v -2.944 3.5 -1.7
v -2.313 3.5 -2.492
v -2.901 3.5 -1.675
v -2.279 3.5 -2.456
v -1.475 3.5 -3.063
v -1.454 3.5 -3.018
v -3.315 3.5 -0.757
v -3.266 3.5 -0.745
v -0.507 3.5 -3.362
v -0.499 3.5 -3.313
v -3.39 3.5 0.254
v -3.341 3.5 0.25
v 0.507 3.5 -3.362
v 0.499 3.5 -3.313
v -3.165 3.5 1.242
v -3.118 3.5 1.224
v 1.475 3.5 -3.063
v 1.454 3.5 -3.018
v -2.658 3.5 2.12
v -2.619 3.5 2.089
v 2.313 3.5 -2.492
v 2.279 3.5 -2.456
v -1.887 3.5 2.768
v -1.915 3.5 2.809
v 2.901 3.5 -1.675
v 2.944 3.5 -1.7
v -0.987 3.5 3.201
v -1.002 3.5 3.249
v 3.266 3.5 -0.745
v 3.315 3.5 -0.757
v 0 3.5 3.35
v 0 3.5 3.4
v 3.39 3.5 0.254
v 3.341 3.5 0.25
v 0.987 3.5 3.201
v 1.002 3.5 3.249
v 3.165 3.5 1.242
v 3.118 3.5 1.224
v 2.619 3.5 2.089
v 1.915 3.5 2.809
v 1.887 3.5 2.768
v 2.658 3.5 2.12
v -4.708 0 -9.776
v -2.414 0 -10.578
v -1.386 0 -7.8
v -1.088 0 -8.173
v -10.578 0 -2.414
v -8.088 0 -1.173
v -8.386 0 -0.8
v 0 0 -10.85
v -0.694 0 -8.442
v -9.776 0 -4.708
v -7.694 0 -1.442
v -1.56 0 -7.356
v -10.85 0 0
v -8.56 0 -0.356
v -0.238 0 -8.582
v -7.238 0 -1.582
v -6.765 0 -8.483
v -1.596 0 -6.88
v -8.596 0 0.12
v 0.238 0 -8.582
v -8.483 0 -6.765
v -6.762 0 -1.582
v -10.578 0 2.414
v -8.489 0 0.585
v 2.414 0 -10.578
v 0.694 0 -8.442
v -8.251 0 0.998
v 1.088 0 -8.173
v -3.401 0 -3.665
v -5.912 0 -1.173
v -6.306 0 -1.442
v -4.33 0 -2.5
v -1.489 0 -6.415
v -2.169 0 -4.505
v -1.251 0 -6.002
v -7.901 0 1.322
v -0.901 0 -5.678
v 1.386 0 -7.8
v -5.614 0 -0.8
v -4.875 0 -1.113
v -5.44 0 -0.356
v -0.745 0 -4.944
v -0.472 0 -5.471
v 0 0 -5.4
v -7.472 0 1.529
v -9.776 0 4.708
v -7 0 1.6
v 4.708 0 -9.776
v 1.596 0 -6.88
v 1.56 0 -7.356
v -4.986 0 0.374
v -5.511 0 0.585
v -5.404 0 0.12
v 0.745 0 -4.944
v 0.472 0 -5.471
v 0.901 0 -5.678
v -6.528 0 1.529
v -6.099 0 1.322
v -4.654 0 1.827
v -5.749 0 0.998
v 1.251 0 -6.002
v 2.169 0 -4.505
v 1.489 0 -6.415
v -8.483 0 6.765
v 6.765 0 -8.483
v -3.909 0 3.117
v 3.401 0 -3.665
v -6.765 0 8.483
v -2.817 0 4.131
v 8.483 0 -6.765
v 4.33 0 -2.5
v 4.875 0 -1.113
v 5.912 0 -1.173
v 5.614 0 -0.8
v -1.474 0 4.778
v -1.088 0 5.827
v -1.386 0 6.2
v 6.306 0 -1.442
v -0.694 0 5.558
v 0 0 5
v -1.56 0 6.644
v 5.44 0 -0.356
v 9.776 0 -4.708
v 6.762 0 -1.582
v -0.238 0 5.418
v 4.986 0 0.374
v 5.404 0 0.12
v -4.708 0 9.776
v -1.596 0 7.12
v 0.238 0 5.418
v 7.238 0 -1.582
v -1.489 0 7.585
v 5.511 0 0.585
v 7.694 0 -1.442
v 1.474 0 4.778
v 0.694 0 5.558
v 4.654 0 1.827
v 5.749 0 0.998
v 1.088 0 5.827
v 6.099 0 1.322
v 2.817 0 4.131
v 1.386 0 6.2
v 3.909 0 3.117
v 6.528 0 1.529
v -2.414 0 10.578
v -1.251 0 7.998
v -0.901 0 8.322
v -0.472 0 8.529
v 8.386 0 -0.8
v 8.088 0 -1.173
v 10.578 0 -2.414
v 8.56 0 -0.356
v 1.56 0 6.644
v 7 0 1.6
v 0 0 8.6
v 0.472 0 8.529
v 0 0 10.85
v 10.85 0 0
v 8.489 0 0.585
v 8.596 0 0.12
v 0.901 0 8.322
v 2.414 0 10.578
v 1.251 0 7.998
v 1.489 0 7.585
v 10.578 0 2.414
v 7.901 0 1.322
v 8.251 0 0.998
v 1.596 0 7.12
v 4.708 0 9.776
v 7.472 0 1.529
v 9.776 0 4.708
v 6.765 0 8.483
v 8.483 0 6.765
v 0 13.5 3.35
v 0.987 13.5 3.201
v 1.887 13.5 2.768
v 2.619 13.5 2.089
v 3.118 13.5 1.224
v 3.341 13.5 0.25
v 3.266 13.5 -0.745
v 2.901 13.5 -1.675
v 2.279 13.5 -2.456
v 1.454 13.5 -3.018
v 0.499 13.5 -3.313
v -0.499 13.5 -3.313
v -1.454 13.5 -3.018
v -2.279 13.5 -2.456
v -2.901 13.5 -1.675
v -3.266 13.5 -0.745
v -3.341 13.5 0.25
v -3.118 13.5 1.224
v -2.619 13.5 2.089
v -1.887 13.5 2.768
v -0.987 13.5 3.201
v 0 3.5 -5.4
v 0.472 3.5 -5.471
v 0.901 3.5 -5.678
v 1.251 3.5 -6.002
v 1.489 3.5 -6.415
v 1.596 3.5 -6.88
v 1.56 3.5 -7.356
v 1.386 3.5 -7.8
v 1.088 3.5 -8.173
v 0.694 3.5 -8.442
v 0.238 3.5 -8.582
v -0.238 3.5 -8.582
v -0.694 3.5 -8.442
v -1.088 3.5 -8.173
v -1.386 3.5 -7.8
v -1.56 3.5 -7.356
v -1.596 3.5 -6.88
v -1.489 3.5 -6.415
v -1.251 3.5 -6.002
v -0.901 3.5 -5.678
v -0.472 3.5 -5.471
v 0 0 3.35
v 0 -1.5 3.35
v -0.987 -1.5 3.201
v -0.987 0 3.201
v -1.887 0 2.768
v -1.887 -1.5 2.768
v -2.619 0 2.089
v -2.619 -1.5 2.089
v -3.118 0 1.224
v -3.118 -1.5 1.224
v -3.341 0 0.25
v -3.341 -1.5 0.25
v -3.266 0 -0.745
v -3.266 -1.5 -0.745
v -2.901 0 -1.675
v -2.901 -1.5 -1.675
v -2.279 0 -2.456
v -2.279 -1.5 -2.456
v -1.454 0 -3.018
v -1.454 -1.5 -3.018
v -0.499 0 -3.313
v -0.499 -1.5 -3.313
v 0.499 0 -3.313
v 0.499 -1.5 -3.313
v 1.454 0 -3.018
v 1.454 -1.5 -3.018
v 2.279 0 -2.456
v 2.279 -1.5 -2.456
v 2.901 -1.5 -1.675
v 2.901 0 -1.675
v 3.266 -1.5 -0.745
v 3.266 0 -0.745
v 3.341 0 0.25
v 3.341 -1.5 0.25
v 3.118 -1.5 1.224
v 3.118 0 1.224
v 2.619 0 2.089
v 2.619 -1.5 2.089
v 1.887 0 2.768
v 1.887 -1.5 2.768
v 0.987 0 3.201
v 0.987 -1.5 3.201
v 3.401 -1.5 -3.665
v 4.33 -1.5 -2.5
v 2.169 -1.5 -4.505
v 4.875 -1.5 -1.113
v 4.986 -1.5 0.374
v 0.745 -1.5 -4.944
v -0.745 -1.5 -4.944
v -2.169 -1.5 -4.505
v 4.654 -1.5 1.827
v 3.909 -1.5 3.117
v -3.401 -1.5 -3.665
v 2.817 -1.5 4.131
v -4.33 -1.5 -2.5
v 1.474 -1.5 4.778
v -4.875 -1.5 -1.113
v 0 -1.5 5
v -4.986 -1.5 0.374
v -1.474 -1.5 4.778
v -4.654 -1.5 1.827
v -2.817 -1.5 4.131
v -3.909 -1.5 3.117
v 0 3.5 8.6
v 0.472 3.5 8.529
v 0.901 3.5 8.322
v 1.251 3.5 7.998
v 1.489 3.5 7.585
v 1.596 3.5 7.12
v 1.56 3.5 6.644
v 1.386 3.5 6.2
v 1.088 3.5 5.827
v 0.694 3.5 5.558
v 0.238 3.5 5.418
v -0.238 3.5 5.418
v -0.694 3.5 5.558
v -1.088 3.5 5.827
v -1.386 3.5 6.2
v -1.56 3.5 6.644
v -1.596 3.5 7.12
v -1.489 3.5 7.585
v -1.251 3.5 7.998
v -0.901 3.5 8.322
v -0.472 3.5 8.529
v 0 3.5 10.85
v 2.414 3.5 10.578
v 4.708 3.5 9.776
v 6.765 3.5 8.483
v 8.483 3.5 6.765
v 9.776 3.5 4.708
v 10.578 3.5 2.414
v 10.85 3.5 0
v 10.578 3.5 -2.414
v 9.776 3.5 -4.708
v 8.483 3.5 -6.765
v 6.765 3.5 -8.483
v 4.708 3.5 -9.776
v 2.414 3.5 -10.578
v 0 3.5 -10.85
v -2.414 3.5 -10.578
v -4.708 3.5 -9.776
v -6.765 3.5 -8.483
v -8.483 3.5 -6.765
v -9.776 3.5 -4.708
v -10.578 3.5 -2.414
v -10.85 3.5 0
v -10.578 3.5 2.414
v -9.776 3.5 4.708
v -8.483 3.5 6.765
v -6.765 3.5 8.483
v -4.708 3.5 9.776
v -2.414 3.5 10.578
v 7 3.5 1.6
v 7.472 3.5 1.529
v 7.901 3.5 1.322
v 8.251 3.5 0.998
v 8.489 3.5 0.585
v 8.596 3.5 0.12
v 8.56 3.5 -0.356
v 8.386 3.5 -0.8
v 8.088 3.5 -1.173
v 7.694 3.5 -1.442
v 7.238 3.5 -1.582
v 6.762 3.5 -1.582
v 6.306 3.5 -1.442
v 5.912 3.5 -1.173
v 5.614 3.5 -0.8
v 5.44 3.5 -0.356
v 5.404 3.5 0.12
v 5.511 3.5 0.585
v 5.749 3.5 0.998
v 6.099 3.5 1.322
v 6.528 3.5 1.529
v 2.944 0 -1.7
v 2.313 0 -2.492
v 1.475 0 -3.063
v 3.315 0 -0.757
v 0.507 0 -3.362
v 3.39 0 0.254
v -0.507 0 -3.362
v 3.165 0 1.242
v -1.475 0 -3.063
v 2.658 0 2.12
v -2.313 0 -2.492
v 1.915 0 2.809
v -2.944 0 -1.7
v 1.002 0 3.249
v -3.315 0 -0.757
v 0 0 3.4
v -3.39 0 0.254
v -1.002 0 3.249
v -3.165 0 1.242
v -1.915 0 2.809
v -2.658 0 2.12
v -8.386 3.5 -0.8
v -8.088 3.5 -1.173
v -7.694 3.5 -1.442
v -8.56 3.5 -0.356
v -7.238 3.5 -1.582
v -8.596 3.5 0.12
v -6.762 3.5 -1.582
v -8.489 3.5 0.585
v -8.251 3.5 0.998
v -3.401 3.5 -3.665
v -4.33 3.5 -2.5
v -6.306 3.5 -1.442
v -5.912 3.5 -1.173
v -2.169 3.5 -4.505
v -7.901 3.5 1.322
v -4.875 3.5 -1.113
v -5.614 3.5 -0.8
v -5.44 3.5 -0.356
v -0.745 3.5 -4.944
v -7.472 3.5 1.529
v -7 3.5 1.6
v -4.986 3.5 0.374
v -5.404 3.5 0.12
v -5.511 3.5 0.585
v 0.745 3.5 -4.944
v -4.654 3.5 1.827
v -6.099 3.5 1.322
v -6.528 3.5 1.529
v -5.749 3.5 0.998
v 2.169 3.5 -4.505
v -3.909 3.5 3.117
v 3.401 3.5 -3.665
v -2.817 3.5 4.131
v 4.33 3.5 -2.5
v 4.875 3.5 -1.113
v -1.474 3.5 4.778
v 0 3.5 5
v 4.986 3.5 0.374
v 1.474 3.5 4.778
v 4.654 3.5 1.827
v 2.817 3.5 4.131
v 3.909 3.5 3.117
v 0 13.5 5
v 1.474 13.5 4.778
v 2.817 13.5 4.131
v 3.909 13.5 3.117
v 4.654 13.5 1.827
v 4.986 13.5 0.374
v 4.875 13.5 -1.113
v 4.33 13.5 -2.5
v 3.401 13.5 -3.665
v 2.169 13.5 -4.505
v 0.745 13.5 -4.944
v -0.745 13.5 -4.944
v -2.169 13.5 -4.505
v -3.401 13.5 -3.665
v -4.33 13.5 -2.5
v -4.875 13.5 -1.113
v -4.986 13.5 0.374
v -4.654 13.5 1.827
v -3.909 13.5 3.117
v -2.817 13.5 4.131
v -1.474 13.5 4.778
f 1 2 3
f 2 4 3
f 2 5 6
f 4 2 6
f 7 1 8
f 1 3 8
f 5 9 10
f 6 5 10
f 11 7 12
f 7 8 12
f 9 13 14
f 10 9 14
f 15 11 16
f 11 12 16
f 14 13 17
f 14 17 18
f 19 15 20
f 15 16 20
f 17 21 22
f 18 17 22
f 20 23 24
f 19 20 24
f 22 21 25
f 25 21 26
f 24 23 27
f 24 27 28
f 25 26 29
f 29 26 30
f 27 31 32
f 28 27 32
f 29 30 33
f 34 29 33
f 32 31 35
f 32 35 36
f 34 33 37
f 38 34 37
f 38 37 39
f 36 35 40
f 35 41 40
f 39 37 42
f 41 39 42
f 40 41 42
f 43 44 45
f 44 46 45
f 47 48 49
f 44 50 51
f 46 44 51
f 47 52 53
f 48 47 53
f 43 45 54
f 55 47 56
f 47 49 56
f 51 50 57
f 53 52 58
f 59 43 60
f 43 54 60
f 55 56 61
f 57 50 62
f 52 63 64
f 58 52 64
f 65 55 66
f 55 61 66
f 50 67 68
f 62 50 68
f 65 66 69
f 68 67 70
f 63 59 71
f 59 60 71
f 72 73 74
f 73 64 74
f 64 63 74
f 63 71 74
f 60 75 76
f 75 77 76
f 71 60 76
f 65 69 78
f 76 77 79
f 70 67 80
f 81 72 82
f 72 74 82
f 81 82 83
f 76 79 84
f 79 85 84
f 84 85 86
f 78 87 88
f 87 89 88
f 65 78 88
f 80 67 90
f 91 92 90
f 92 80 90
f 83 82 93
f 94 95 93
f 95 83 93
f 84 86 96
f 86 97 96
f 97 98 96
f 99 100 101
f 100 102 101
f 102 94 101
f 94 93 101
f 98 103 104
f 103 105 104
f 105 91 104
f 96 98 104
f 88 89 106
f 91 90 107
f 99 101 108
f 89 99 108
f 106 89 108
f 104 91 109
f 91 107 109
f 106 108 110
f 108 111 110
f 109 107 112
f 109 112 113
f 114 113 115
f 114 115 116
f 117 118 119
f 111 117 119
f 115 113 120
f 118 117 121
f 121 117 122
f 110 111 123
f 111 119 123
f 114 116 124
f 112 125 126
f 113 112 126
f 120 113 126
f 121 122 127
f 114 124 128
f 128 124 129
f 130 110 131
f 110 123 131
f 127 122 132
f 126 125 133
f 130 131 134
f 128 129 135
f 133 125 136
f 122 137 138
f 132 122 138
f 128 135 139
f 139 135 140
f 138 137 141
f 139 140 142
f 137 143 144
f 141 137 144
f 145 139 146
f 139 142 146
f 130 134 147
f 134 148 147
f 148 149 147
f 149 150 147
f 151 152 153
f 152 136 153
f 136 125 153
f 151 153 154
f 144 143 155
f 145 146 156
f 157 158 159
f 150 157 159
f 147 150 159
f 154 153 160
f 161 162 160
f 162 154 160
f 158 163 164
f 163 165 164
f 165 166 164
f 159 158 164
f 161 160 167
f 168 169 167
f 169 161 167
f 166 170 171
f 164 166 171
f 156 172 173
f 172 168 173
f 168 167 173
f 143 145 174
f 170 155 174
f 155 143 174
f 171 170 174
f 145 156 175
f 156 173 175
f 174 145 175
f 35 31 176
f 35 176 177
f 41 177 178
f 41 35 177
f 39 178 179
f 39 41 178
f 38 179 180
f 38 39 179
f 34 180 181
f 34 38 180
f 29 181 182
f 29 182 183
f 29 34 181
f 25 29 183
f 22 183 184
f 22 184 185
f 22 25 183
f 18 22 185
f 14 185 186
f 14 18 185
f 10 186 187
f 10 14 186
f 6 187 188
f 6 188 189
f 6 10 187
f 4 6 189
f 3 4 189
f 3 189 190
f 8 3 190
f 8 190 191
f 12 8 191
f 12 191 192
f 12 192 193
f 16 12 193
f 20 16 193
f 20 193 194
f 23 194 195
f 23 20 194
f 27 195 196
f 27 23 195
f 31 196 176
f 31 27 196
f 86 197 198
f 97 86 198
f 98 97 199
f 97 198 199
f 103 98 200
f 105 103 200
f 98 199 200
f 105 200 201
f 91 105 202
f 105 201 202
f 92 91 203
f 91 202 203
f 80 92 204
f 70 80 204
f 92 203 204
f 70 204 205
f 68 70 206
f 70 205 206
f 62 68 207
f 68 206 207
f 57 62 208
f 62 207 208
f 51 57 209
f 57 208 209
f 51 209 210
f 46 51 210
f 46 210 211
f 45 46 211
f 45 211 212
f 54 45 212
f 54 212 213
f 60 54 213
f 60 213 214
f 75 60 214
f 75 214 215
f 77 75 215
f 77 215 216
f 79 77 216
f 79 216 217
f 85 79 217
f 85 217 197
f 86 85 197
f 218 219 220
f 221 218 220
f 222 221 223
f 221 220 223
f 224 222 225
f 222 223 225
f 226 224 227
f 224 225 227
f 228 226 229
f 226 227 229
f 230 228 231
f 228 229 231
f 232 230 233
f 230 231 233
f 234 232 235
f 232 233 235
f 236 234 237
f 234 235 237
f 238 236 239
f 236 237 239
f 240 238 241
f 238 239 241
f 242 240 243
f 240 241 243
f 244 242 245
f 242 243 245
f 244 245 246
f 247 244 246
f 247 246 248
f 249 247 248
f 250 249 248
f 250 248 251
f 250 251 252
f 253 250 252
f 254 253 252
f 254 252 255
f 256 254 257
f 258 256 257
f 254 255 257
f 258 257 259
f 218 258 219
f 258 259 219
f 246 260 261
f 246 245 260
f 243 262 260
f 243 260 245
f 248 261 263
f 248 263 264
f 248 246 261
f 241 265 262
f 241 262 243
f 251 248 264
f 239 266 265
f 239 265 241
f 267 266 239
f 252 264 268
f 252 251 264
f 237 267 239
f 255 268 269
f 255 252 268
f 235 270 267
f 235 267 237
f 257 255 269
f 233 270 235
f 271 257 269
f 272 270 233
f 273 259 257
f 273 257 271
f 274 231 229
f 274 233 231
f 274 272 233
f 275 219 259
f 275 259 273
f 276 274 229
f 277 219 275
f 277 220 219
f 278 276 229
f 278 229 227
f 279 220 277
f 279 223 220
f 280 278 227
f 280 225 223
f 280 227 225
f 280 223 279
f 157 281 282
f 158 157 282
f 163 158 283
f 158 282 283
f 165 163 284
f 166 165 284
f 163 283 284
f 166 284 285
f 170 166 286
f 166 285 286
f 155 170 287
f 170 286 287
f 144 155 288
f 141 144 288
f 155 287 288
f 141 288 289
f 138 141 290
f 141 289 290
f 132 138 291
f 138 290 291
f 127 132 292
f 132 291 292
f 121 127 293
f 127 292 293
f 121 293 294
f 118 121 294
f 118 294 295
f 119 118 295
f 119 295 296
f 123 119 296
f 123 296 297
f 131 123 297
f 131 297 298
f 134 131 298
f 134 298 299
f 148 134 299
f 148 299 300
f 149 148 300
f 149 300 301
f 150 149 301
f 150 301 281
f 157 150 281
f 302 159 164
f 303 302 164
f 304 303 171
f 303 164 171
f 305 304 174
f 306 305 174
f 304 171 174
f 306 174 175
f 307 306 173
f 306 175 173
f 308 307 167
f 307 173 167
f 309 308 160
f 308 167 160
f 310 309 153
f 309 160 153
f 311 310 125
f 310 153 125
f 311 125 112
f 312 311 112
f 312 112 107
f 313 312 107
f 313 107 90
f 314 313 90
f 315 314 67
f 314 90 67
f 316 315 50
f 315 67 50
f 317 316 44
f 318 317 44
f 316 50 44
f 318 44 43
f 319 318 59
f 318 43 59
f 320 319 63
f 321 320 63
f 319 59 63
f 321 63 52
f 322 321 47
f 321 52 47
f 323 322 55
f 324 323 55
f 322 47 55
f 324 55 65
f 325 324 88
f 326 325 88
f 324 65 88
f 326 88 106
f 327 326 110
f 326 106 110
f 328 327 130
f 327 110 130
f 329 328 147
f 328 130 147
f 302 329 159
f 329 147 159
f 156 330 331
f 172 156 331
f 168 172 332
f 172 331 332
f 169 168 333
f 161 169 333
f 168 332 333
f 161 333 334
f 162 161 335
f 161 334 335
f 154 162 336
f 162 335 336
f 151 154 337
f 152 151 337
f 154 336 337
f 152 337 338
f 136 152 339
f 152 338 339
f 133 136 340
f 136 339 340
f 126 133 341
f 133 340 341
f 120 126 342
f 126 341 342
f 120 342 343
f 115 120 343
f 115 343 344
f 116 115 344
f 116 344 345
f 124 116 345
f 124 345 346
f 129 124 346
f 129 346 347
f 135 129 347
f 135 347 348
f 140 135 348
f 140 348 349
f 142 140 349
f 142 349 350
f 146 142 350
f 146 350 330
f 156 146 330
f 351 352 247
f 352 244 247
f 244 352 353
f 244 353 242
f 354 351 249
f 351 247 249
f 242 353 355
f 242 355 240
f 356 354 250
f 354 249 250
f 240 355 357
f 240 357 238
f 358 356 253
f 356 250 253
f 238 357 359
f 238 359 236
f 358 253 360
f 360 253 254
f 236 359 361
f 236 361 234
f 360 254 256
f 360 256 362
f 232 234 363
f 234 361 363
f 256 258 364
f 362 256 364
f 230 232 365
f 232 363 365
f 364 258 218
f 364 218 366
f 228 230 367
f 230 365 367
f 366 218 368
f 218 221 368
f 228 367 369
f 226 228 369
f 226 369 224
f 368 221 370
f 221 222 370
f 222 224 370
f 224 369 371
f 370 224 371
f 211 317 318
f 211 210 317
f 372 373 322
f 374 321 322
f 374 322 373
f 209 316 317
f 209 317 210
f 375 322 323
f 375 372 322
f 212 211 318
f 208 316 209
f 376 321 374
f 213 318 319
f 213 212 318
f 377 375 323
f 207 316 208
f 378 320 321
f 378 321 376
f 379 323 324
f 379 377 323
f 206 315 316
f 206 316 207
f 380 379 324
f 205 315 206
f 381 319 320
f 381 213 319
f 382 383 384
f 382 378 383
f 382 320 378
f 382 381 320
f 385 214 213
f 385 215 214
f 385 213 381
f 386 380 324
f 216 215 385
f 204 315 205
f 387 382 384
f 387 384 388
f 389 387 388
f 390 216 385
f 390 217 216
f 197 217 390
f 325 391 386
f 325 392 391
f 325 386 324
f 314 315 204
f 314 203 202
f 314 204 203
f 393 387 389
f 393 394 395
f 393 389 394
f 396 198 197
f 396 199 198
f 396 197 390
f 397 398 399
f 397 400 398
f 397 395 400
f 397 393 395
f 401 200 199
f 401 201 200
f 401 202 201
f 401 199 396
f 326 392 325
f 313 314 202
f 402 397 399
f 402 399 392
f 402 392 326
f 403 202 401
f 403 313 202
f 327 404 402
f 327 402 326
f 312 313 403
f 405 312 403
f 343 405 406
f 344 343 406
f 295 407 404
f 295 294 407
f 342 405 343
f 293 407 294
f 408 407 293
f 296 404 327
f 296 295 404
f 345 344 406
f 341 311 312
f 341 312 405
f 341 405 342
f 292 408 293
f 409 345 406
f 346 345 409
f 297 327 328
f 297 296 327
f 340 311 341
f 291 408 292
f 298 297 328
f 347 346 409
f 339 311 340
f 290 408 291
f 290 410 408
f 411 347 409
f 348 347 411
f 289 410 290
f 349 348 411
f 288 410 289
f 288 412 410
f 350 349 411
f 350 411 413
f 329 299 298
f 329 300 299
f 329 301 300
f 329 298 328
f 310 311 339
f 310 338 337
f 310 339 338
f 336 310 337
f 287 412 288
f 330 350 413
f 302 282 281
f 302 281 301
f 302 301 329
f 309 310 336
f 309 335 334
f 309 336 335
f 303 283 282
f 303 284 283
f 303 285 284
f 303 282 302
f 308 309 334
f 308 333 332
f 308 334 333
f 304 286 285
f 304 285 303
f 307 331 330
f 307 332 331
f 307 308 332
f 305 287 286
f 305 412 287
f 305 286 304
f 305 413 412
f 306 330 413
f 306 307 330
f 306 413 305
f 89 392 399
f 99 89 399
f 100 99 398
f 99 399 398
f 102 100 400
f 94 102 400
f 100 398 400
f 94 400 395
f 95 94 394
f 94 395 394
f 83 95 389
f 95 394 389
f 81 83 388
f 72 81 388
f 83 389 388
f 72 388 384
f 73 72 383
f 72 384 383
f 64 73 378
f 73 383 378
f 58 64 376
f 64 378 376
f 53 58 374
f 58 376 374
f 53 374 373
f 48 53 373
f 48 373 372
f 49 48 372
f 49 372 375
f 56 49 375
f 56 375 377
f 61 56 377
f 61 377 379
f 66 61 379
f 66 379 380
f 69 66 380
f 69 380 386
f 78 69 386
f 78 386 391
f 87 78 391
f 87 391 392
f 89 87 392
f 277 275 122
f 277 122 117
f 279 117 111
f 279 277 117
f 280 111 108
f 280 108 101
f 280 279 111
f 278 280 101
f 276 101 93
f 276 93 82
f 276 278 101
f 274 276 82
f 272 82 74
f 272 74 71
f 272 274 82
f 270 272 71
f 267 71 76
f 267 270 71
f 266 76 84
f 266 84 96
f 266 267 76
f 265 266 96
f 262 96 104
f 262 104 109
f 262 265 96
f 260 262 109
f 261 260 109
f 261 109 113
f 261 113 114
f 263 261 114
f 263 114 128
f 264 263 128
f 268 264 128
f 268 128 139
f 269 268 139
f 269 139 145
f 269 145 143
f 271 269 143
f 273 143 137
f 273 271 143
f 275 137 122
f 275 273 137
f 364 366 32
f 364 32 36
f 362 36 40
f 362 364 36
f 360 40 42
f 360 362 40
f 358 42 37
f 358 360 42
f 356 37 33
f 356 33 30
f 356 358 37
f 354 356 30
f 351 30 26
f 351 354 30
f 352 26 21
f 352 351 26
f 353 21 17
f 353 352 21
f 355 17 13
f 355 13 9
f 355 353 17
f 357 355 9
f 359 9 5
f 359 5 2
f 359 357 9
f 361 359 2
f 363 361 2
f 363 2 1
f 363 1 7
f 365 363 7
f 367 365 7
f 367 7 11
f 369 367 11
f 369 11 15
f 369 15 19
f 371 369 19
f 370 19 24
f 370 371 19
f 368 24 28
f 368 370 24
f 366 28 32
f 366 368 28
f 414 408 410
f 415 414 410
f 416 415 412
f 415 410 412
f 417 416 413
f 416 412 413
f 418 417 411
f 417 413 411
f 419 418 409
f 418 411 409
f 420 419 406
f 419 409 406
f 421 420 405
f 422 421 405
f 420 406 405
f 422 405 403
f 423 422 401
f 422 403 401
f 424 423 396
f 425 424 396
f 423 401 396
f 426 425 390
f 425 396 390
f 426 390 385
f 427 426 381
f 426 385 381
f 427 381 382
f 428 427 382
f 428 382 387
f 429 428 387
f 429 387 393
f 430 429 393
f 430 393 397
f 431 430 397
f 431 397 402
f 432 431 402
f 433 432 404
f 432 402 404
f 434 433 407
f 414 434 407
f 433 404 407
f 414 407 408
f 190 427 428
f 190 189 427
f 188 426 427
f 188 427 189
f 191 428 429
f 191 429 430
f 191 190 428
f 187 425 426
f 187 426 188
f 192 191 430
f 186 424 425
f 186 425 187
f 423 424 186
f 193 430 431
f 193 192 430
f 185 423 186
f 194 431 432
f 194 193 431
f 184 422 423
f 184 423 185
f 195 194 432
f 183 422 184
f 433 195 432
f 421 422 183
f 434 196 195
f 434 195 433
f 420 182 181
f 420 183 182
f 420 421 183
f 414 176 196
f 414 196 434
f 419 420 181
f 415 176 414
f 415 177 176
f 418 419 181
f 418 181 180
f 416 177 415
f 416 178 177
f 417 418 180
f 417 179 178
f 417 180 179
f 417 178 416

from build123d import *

# Parameters (mm, degrees)
SKETCH_1_R          = 10.85
SKETCH_1_R_2        = 3.4
EXTRUDE_1_DEPTH     = 3.5
SKETCH_2_R          = 5
SKETCH_2_R_2        = 3.35
EXTRUDE_2_DEPTH     = 10
SKETCH_3_R          = 1.6
CUT_EXTRUDE_1_DEPTH = 19.315157657
EXTRUDE_START       = 1.5
SKETCH_4_R          = 5
SKETCH_4_R_2        = 3.35
EXTRUDE_3_DEPTH     = 1.5


with BuildPart() as part:
    # Эскиз1 → Бобышка-Вытянуть1 (new body)
    with BuildSketch(Plane(origin=(0, 0, 0), x_dir=(1, 0, 0), z_dir=(0, 1, 0))):
        with Locations(Location((0, 0, 0), (0, 0, 270))):
            Circle(SKETCH_1_R)
        with Locations(Location((0, 0, 0), (0, 0, 270))):
            Circle(SKETCH_1_R_2, mode=Mode.SUBTRACT)
    extrude(amount=EXTRUDE_1_DEPTH)

    # Эскиз2 → Бобышка-Вытянуть2 (add)
    with BuildSketch(Plane(origin=(0, 3.5, 0), x_dir=(1, 0, 0), z_dir=(0, 1, 0))):
        with Locations(Location((0, 0, 0), (0, 0, 270))):
            Circle(SKETCH_2_R)
        with Locations(Location((0, 0, 0), (0, 0, 270))):
            Circle(SKETCH_2_R_2, mode=Mode.SUBTRACT)
    extrude(amount=EXTRUDE_2_DEPTH)

    # Эскиз3 → Вырез-Вытянуть1 (cut, through all)
    with BuildSketch(Plane(origin=(0, 3.5, 0), x_dir=(1, 0, 0), z_dir=(0, 1, 0))):
        with Locations(Location((0, 7, 0), (0, 0, 270))):
            Circle(SKETCH_3_R)
        with Locations(Location((-7, 0, 0), (0, 0, 270))):
            Circle(SKETCH_3_R)
        with Locations(Location((0, -7, 0), (0, 0, 270))):
            Circle(SKETCH_3_R)
        with Locations(Location((7, 0, 0), (0, 0, 270))):
            Circle(SKETCH_3_R)
    extrude(amount=-CUT_EXTRUDE_1_DEPTH, mode=Mode.SUBTRACT)

    # Эскиз4 → Бобышка-Вытянуть3 (add)
    with BuildSketch(Plane(origin=(0, 0, 0), x_dir=(-1, 0, 0), z_dir=(0, -1, 0)).offset(EXTRUDE_START)):
        with Locations(Location((0, 0, 0), (0, 0, 270))):
            Circle(SKETCH_4_R)
        with Locations(Location((0, 0, 0), (0, 0, 270))):
            Circle(SKETCH_4_R_2, mode=Mode.SUBTRACT)
    extrude(amount=-EXTRUDE_3_DEPTH)


solid = part.part
